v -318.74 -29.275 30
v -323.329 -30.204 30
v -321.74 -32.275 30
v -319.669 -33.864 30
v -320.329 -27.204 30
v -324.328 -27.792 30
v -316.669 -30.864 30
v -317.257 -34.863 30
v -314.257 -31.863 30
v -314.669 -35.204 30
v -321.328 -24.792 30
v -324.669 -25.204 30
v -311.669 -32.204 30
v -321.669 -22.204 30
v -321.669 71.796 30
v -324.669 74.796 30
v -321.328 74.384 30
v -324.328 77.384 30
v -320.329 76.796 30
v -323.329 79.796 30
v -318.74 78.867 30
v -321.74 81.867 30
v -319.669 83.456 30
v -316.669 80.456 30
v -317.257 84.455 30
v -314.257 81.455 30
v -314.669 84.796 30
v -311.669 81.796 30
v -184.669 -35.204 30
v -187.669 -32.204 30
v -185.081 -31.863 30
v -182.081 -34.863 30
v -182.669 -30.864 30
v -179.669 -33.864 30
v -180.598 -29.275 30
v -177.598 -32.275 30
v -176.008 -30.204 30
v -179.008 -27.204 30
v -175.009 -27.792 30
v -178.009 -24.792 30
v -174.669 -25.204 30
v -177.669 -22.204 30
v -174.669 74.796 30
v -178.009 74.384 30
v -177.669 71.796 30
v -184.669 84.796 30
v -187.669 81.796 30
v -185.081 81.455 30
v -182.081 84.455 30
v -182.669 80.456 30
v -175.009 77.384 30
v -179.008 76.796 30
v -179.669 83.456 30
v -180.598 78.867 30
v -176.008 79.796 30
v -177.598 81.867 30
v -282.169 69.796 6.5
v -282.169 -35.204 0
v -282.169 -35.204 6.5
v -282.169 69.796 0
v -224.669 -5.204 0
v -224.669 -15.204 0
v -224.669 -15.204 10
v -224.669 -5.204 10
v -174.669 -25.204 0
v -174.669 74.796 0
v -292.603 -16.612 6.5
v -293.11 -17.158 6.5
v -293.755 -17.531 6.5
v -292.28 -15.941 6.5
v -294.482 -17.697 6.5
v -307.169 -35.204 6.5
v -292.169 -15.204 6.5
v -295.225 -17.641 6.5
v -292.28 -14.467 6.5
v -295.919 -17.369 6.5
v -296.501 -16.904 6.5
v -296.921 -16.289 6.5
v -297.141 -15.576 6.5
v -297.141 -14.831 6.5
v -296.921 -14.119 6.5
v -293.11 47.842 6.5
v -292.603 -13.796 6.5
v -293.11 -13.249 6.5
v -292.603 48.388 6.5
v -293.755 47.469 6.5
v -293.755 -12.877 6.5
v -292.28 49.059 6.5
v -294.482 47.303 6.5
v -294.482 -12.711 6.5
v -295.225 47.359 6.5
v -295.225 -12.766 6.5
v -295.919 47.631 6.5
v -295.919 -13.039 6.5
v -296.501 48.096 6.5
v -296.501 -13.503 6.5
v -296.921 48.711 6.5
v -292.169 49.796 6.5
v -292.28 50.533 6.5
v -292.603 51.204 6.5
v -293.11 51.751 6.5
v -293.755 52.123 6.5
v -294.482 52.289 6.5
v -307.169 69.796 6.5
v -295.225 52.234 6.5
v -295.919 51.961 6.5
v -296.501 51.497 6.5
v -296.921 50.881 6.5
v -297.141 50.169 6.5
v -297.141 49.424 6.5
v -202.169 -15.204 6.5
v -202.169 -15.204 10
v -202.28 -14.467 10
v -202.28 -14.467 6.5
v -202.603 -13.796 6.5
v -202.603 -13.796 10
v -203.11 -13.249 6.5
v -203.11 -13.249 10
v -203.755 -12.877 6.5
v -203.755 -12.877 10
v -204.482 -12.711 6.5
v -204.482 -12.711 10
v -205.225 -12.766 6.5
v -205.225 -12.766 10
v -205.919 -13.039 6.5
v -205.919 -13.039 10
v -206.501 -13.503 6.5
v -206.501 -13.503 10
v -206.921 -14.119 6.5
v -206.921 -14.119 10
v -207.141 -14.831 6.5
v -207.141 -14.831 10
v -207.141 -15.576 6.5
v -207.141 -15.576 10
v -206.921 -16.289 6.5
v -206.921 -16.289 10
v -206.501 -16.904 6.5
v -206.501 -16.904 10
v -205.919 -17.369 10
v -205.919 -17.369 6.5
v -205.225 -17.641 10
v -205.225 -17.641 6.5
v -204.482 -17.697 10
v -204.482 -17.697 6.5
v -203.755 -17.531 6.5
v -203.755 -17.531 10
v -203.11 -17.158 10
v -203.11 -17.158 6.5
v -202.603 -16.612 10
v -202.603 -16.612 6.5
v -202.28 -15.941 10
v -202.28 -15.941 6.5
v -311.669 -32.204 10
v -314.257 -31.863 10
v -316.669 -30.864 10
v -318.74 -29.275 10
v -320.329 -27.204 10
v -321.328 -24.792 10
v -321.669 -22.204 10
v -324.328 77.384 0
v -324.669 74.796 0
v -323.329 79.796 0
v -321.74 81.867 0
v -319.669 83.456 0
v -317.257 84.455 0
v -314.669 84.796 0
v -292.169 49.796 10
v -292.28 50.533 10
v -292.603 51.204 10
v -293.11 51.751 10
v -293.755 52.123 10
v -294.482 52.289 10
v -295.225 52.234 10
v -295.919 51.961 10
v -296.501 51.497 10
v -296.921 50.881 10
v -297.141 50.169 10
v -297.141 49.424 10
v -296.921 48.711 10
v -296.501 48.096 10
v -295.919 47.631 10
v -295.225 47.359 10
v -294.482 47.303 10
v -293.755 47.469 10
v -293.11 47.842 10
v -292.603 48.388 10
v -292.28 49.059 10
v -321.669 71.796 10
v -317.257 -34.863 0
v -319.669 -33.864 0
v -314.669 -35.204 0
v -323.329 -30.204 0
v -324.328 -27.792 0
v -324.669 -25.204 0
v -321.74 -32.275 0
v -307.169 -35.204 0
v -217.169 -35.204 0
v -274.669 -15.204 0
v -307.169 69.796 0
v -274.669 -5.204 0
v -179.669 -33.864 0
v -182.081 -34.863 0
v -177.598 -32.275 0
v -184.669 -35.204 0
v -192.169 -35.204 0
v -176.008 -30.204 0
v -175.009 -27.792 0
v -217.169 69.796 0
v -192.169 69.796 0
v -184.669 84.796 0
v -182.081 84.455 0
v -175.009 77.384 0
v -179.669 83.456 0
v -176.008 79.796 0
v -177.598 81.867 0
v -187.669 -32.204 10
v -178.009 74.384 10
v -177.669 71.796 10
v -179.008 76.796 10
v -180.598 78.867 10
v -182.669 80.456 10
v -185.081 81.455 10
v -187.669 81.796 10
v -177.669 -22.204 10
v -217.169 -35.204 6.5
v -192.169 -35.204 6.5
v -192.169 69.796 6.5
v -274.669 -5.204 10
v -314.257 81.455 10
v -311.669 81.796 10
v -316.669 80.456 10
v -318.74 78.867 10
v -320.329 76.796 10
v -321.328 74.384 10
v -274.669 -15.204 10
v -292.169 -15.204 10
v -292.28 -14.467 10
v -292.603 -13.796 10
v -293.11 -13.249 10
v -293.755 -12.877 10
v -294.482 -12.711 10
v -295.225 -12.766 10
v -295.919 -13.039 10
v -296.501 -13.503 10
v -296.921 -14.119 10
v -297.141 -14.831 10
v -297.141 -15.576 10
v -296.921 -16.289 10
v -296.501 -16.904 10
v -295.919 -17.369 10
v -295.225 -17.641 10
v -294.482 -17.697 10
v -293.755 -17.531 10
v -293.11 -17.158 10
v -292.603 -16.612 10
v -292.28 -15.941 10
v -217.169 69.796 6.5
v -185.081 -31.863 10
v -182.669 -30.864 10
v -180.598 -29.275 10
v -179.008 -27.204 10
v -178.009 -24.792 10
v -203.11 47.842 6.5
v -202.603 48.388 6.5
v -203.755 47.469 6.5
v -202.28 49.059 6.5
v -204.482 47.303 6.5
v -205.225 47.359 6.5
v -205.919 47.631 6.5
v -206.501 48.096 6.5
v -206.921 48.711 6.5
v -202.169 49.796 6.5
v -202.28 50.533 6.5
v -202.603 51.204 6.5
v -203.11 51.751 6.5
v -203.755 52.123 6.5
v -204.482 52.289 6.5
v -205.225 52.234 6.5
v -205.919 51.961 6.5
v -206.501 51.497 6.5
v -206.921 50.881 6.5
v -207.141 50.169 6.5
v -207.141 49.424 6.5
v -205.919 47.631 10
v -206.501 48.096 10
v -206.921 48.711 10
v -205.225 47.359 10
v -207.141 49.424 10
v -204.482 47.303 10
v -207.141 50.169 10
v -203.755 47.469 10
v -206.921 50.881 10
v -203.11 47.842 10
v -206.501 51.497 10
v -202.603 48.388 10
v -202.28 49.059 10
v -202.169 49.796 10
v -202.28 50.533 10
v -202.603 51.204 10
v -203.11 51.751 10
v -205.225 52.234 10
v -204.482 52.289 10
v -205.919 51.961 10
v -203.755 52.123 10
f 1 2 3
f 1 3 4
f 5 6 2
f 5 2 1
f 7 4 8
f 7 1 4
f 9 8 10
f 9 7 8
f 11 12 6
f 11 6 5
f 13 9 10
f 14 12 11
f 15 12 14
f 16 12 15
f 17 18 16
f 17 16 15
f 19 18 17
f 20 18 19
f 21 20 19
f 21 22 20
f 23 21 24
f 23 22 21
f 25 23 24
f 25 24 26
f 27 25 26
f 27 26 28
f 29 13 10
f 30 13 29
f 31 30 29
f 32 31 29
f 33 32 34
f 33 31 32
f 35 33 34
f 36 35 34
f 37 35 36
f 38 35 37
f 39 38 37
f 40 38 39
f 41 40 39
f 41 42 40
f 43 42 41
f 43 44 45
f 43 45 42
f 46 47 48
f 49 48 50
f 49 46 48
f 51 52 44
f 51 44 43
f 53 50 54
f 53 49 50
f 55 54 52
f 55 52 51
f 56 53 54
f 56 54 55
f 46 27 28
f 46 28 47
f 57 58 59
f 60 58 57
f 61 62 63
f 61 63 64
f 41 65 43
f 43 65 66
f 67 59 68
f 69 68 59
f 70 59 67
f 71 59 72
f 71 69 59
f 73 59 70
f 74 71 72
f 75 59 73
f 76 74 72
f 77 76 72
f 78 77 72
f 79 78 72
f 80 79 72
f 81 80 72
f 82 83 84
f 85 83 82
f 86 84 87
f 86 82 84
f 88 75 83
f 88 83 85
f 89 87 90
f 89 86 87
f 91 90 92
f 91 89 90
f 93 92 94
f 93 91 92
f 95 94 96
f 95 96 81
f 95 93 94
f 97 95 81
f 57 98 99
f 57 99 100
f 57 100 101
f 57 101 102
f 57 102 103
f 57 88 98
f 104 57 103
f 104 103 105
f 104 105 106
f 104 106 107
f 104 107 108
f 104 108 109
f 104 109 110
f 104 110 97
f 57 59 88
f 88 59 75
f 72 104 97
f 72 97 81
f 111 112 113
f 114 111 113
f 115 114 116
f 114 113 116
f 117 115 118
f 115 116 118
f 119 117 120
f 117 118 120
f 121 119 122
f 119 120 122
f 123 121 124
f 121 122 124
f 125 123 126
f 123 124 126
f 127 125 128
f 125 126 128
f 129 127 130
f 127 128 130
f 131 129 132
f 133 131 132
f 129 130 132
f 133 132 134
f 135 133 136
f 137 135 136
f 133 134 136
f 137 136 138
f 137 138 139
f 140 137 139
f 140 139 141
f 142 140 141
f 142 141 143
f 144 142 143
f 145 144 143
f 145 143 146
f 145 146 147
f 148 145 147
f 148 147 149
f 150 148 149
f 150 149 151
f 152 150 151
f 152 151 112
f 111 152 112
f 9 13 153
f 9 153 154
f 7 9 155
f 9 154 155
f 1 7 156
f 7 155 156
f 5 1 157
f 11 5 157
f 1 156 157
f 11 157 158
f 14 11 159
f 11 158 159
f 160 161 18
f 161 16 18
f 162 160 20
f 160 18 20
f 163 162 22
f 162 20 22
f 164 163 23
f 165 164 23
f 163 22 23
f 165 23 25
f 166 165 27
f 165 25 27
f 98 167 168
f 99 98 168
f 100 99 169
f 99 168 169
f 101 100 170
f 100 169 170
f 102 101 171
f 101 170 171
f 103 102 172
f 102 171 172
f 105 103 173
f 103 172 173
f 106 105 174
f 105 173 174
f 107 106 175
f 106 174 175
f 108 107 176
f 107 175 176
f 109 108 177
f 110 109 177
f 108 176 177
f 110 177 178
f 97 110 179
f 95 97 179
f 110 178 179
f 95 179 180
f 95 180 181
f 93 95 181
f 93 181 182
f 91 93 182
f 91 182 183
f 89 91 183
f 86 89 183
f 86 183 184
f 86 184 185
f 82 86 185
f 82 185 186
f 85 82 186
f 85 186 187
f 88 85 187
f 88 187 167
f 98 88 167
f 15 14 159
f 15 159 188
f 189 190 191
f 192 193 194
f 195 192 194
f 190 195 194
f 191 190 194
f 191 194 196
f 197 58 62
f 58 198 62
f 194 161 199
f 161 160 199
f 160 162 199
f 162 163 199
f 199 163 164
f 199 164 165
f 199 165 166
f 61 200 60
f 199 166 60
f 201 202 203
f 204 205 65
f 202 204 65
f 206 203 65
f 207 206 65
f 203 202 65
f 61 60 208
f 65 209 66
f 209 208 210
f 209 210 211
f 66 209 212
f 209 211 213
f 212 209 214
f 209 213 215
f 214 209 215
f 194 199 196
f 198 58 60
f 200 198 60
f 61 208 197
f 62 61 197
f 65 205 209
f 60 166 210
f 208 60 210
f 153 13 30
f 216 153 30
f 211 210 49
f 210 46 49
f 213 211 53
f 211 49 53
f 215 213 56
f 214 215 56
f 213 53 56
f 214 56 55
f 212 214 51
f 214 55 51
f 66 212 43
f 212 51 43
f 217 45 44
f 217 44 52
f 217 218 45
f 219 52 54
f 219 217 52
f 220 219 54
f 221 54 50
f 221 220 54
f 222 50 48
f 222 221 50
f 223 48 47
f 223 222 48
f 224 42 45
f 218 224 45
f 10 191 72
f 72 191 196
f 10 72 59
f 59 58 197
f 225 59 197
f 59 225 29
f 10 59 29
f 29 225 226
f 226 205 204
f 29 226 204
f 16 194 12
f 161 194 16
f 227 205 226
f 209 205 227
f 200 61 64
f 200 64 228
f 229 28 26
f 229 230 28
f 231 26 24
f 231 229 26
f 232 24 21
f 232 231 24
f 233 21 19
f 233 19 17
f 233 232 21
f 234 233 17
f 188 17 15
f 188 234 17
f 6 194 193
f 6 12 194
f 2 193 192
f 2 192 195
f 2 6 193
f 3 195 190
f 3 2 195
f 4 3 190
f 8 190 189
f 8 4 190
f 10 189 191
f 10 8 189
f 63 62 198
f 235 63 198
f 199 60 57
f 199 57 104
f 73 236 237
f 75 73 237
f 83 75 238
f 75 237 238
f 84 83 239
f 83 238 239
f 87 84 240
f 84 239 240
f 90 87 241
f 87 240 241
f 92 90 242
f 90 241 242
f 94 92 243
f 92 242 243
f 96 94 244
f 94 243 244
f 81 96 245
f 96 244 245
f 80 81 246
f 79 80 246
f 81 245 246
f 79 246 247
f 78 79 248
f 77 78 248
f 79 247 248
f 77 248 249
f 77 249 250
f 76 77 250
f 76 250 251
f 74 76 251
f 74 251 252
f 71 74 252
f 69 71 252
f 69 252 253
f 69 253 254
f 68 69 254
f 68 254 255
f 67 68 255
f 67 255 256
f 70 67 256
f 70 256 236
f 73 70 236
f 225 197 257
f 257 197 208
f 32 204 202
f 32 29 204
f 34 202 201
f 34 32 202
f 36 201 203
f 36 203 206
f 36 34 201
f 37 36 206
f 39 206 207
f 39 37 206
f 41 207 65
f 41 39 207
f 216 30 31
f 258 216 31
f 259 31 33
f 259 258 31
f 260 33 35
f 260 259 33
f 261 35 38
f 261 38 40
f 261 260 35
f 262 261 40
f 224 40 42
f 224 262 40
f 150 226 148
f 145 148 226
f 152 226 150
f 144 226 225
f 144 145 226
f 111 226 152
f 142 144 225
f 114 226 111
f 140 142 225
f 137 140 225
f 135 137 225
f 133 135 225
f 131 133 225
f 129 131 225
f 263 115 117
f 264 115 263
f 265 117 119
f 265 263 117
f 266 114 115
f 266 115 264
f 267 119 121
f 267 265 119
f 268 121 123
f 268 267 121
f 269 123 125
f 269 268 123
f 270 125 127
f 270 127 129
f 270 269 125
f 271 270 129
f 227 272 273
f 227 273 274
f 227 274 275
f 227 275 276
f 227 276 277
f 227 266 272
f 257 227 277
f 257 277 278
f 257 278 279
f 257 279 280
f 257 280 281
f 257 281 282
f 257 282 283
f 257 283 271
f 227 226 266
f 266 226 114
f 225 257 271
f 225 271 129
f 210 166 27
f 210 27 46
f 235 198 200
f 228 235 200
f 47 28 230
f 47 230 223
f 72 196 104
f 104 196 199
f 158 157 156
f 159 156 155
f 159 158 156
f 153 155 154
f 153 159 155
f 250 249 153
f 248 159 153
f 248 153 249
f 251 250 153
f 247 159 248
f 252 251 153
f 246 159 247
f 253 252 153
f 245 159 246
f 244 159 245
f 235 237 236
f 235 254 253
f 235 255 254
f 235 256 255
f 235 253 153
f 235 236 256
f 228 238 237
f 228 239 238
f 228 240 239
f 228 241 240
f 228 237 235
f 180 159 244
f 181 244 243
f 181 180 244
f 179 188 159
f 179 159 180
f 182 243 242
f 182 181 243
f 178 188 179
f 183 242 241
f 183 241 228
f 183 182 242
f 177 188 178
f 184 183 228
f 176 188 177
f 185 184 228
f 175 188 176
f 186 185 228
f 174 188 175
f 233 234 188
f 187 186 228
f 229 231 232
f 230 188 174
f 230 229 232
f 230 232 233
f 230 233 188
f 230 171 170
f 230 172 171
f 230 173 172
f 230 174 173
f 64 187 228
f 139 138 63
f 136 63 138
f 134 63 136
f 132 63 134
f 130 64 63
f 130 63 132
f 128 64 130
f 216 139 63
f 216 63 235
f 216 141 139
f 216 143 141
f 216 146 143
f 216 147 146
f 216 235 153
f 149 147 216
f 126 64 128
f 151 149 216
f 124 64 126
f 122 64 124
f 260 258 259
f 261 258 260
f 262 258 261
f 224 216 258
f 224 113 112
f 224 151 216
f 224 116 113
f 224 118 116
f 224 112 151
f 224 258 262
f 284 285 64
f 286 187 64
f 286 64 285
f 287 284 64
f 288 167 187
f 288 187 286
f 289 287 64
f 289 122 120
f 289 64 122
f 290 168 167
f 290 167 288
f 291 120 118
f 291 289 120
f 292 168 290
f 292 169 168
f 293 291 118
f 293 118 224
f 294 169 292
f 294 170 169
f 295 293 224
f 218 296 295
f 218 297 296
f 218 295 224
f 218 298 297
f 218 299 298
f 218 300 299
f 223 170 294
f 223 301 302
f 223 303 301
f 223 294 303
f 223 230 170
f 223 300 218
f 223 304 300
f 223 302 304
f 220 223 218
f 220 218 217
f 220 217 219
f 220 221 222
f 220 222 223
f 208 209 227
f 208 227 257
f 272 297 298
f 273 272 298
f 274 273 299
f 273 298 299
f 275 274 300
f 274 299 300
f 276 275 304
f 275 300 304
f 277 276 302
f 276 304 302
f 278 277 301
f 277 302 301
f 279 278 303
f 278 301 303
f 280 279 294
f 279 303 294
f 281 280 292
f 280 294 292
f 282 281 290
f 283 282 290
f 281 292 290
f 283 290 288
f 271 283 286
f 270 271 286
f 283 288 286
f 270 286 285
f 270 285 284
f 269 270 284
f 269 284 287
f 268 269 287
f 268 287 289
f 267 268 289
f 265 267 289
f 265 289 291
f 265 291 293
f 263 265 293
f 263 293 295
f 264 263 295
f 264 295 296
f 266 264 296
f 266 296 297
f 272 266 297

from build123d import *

# Parameters (mm, degrees)
SKETCH1_W                 = 150
SKETCH1_H                 = 120
BOSS_EXTRUDE1_DEPTH       = 30
SKETCH2_W                 = 25
SKETCH2_H                 = 105
CUT_EXTRUDE1_DEPTH        = 6.5
SKETCH4_W                 = 144
SKETCH4_H                 = 114
CUT_EXTRUDE2_DEPTH        = 20
FILLET1_R                 = 10
F_5_0MM_DOWEL_HOLE1_D     = 5
F_5_0MM_DOWEL_HOLE1_DEPTH = 20
F_5_0MM_DOWEL_HOLE1_TIP   = 1.502151548
SKETCH12_W                = 50
SKETCH12_H                = 10
CUT_EXTRUDE6_DEPTH        = 337.897861193


with BuildPart() as part:
    # Sketch1 → Boss-Extrude1 (new body)
    with BuildSketch(Plane.XY):
        with Locations((-249.668715257, 24.796192189)):
            Rectangle(SKETCH1_W, SKETCH1_H)
    extrude(amount=BOSS_EXTRUDE1_DEPTH)

    # Sketch2 → Cut-Extrude1 (cut)
    with BuildSketch(Plane(origin=(0, 0, 0), x_dir=(-1, 0, 0), z_dir=(0, 0, -1))):
        with Locations((204.668715257, 17.296192189)):
            Rectangle(SKETCH2_W, SKETCH2_H)
        with Locations((294.668715257, 17.296192189)):
            Rectangle(SKETCH2_W, SKETCH2_H)
    extrude(amount=-CUT_EXTRUDE1_DEPTH, mode=Mode.SUBTRACT)

    # Sketch4 → Cut-Extrude2 (cut)
    with BuildSketch(Plane.XY.offset(30)):
        with Locations((-249.668715257, 24.796192189)):
            Rectangle(SKETCH4_W, SKETCH4_H)
    extrude(amount=-CUT_EXTRUDE2_DEPTH, mode=Mode.SUBTRACT)

    # Fillet1
    fillet1_edges = [part.edges().sort_by_distance(p)[0] for p in [
        (-177.668715257, 81.796192189, 20),
        (-177.668715257, -32.203807811, 20),
        (-321.668715257, -32.203807811, 20),
        (-321.668715257, 81.796192189, 20),
        (-174.668715257, -35.203807811, 15),
        (-324.668715257, -35.203807811, 15),
        (-324.668715257, 84.796192189, 15),
        (-174.668715257, 84.796192189, 15),
    ]]
    fillet(fillet1_edges, radius=FILLET1_R)

    # Ø5.0mm Dowel Hole1
    with Locations(Plane(origin=(0, 0, 6.5), x_dir=(-1, 0, 0), z_dir=(0, 0, -1))):
        with Locations((204.668715257, 49.796192189), (204.668715257, -15.203807811), (294.668715257, 49.796192189), (294.668715257, -15.203807811)):
            Hole(F_5_0MM_DOWEL_HOLE1_D / 2, depth=F_5_0MM_DOWEL_HOLE1_DEPTH)
            with Locations((0, 0, -(F_5_0MM_DOWEL_HOLE1_DEPTH + F_5_0MM_DOWEL_HOLE1_TIP / 2))):  # 118° drill point
                Cone(0, F_5_0MM_DOWEL_HOLE1_D / 2, F_5_0MM_DOWEL_HOLE1_TIP, mode=Mode.SUBTRACT)

    # Sketch12 → Cut-Extrude6 (cut, through all)
    with BuildSketch(Plane(origin=(0, 0, 0), x_dir=(-1, 0, 0), z_dir=(0, 0, -1))):
        with Locations((249.668715257, -10.203807811)):
            Rectangle(SKETCH12_W, SKETCH12_H)
    extrude(amount=-CUT_EXTRUDE6_DEPTH, mode=Mode.SUBTRACT)


solid = part.part
